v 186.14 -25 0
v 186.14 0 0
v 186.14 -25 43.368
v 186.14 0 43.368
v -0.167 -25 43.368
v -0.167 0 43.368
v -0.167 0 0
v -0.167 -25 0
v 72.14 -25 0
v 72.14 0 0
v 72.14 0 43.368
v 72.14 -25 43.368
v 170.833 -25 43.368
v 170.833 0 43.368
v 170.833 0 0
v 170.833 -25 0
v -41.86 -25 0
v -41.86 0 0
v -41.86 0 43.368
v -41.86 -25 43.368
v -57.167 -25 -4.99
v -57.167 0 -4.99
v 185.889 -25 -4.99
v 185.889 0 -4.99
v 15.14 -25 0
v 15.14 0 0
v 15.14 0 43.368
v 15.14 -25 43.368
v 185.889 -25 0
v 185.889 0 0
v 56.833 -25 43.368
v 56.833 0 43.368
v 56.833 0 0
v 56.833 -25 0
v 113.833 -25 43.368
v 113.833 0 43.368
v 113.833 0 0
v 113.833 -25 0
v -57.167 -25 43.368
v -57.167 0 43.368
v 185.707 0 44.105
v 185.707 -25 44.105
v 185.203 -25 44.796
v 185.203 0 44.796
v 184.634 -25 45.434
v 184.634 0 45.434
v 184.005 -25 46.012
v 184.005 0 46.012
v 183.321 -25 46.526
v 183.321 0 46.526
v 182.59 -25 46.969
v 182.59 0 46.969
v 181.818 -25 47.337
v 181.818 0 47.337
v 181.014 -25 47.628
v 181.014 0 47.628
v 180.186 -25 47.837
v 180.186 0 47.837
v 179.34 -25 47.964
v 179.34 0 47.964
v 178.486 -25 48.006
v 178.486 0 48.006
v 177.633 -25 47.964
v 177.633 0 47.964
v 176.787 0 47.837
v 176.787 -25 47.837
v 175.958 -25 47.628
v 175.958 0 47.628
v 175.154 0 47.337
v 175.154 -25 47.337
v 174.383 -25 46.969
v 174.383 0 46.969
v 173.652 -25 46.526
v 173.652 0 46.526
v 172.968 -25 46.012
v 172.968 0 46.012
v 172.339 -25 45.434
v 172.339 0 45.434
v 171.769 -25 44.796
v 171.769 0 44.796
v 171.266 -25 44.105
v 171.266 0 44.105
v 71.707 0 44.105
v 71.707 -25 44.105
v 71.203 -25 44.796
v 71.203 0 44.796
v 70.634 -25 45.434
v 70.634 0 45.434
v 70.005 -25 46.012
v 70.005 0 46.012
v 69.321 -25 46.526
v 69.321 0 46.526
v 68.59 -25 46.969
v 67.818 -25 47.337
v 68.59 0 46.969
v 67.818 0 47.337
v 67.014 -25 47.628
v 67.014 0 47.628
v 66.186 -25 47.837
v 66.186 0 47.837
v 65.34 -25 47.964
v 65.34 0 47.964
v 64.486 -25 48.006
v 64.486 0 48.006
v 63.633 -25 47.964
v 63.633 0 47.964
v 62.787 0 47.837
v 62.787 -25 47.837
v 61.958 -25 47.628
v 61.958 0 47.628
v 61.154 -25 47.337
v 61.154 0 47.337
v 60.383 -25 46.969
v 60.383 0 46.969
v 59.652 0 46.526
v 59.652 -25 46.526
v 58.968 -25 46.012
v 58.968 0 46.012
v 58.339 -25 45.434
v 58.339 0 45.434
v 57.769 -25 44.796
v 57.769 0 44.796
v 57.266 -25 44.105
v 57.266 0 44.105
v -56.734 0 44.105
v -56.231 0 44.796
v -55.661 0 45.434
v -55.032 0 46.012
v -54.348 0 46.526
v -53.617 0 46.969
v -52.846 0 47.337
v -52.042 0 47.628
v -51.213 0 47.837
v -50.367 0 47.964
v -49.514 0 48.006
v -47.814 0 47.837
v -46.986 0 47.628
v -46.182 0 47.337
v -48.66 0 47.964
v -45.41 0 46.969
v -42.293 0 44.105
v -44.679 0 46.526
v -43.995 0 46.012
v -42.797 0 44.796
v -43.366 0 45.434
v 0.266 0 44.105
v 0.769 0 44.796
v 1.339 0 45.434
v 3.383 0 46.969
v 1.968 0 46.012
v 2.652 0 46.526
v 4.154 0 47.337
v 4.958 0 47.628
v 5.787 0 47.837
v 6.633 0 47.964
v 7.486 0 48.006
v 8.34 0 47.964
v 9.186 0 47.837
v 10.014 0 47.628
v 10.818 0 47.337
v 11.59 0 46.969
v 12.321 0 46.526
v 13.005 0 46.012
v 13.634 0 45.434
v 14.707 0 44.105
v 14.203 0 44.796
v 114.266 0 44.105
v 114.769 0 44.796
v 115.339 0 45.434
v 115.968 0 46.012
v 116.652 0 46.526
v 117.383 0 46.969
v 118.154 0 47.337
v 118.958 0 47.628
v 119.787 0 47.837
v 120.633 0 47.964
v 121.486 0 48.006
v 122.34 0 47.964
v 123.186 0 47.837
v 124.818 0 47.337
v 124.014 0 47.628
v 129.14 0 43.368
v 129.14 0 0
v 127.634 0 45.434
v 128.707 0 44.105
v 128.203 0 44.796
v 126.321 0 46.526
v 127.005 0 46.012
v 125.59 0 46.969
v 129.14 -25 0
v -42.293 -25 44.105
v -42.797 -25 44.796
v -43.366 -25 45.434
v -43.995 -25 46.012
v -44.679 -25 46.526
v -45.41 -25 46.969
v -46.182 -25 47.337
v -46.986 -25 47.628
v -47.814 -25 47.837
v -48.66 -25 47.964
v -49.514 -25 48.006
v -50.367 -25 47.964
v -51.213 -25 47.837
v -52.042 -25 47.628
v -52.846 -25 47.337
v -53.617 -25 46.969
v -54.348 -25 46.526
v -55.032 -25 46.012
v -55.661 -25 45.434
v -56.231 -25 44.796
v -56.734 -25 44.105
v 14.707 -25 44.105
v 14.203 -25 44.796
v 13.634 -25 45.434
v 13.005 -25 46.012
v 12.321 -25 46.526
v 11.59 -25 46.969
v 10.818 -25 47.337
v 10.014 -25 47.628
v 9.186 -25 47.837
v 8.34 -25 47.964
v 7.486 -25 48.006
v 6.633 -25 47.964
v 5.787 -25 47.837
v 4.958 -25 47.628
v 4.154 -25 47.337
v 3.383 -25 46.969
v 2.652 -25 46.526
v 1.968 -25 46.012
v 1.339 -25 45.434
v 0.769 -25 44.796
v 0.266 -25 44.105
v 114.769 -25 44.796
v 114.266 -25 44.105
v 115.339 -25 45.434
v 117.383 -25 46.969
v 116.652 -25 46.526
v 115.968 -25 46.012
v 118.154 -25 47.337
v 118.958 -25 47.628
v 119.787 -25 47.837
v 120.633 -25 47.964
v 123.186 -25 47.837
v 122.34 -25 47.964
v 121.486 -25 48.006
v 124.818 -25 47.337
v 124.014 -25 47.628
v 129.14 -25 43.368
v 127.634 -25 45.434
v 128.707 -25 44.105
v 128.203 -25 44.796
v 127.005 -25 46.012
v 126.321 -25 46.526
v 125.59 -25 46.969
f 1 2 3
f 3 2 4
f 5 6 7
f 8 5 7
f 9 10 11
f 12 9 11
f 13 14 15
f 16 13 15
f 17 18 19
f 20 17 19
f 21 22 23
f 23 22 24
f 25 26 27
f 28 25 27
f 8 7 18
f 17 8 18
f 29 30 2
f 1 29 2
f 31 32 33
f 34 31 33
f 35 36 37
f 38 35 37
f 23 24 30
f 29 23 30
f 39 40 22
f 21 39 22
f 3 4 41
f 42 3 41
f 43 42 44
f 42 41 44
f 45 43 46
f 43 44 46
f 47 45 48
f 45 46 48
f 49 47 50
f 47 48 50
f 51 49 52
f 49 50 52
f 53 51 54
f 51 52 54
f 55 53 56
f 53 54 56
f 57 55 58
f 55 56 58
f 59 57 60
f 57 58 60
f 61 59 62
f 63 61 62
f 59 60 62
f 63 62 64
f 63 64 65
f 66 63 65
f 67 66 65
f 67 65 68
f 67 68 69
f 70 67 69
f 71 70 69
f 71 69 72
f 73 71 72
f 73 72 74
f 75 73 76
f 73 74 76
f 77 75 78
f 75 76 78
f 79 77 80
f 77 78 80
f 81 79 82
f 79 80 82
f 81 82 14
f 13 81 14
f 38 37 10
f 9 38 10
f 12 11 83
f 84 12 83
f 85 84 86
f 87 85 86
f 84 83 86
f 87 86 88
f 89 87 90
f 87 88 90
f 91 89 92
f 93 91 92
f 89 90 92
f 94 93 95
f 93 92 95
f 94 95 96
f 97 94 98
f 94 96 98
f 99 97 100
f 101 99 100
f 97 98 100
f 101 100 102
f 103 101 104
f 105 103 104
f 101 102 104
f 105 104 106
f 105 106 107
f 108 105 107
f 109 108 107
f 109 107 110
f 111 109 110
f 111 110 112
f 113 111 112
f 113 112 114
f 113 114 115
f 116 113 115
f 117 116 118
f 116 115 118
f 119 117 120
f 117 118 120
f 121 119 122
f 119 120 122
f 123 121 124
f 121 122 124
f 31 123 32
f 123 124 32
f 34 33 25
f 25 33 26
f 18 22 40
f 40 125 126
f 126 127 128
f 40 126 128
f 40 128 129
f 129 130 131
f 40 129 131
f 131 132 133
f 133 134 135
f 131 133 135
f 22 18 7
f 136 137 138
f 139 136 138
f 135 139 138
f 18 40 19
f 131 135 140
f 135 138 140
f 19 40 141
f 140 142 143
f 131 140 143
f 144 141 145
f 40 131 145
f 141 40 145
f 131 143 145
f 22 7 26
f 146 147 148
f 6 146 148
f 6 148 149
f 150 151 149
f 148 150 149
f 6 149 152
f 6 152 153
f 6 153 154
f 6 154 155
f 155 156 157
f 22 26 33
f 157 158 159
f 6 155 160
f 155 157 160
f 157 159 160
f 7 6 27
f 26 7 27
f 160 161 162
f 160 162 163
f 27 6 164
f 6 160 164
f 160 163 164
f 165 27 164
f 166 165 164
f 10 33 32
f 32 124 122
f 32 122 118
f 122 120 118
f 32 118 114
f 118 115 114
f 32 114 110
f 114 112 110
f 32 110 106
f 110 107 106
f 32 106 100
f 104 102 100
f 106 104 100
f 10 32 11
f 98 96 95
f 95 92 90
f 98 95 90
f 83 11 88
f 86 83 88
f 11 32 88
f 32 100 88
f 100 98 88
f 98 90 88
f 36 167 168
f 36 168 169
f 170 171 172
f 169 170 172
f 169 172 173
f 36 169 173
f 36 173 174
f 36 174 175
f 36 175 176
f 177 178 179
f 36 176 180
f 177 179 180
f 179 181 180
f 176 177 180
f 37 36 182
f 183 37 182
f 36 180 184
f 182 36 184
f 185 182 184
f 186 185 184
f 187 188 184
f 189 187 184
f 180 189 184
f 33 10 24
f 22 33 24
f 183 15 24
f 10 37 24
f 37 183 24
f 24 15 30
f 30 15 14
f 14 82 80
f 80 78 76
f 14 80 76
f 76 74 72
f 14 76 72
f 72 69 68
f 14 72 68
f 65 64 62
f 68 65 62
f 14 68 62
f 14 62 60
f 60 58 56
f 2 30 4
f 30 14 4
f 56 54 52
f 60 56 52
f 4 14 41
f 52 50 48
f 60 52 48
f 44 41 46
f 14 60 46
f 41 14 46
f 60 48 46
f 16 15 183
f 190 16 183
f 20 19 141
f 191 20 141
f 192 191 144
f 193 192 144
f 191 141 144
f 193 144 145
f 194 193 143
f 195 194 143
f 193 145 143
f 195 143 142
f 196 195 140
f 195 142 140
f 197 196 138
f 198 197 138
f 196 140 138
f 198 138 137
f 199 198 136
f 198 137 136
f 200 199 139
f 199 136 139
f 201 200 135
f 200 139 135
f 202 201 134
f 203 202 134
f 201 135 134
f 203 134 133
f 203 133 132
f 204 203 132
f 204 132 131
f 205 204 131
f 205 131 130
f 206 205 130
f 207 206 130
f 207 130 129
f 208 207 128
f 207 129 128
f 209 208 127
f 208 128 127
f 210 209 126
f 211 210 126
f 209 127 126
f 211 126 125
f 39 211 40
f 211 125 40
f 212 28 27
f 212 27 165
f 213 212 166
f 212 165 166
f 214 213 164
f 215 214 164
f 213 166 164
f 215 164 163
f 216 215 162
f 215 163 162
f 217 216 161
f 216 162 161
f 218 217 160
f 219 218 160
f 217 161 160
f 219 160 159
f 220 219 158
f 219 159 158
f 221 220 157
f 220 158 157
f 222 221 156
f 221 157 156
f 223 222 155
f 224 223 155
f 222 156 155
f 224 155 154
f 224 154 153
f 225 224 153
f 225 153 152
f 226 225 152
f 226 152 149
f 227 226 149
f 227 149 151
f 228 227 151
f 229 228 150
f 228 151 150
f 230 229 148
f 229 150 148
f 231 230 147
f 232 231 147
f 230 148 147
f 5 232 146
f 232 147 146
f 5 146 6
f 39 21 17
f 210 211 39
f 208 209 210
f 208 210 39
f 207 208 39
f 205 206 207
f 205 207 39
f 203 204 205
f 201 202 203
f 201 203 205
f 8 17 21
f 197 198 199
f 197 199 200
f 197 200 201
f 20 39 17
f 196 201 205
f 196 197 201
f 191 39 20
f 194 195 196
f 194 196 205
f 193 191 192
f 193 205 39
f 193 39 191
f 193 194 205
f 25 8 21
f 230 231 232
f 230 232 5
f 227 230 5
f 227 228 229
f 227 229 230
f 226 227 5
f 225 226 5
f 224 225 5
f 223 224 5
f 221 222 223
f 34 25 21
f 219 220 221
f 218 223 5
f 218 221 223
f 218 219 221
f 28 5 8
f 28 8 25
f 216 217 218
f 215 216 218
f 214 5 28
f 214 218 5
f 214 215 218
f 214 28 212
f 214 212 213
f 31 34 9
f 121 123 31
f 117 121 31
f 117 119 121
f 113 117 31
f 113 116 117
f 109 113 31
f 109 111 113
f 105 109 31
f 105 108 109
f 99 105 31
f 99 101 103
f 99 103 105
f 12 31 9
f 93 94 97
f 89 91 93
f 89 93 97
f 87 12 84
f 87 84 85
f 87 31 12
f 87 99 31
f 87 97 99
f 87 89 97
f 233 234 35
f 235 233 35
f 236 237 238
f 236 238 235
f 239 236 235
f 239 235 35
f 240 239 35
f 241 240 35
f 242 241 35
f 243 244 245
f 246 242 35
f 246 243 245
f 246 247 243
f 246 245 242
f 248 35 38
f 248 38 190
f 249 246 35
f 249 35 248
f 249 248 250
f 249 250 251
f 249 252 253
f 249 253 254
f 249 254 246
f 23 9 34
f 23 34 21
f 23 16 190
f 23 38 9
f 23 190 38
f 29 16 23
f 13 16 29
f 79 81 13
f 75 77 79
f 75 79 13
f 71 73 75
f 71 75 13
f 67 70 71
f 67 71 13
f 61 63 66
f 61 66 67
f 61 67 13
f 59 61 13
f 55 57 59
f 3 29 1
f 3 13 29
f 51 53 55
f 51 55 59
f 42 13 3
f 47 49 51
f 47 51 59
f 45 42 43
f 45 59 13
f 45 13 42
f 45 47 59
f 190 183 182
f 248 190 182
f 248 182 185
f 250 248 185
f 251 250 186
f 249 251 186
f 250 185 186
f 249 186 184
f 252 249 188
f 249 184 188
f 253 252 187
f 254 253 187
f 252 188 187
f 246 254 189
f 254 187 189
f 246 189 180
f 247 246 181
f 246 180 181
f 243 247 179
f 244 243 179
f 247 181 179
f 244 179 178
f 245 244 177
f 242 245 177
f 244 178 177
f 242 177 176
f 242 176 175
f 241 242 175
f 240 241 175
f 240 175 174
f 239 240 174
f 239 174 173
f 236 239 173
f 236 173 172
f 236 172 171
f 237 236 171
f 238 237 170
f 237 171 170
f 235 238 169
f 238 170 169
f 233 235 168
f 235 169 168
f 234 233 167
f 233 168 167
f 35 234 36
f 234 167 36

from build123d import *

# Parameters (mm, degrees)
F1_DEPTH = 25


# Not quite as in the source:
# - a feature names something its author has since deleted; it is built from what else it names


with BuildPart() as f1:
    # F0 (on Front) → F1 (new body)
    with BuildSketch(Plane.XZ):
        with BuildLine():
            Line((-57.1667980403, 43.3679167181), (-57.1667980403, 0))
            Line((-57.1667980403, 0), (-41.8604705483, 0))
            Line((-41.8604705483, 0), (-41.8604705483, 43.3679167181))
            ThreePointArc((-41.8604705483, 43.3679167181), (-49.5136342943, 48.0061937124), (-57.1667980403, 43.3679167181))
        make_face()
        with BuildLine():
            Line((-0.1667980403, 43.3679167181), (-0.1667980403, 0))
            Line((-0.1667980403, 0), (15.1395294517, 0))
            Line((15.1395294517, 0), (15.1395294517, 43.3679167181))
            ThreePointArc((15.1395294517, 43.3679167181), (7.4863657057, 48.0061937124), (-0.1667980403, 43.3679167181))
        make_face()
        with BuildLine():
            Line((56.8332019597, 43.3679167181), (56.8332019597, 0))
            Line((56.8332019597, 0), (72.1395294517, 0))
            Line((72.1395294517, 0), (72.1395294517, 43.3679167181))
            ThreePointArc((72.1395294517, 43.3679167181), (64.4863657057, 48.0061937124), (56.8332019597, 43.3679167181))
        make_face()
        with BuildLine():
            Line((113.8332019597, 0), (129.1395294517, 0))
            Line((129.1395294517, 0), (129.1395294517, 43.3679167181))
            ThreePointArc((129.1395294517, 43.3679167181), (121.4863657057, 48.0061937124), (113.8332019597, 43.3679167181))
            Line((113.8332019597, 43.3679167181), (113.8332019597, 0))
        make_face()
        with BuildLine():
            Line((170.8332019597, 0), (185.8886182308, 0))
            Line((185.8886182308, 0), (186.1395294517, 0))
            Line((186.1395294517, 0), (186.1395294517, 43.3679167181))
            ThreePointArc((186.1395294517, 43.3679167181), (178.4863657057, 48.0061937124), (170.8332019597, 43.3679167181))
            Line((170.8332019597, 43.3679167181), (170.8332019597, 0))
        make_face()
        Polygon((-41.8604705483, 0), (-57.1667980403, 0), (-57.1667980403, -4.9899439327), (185.8886182308, -4.9899439327), (185.8886182308, 0), (170.8332019597, 0), (162.9481277168, 0), (140.3730809391, 0), (129.1395294517, 0), (113.8332019597, 0), (105.9481277168, 0), (83.3730809391, 0), (72.1395294517, 0), (56.8332019597, 0), (48.9481277168, 0), (15.1395294517, 0), (-0.1667980403, 0), (-8.0518722832, 0), align=None)
    extrude(amount=F1_DEPTH)


solid = f1.part
